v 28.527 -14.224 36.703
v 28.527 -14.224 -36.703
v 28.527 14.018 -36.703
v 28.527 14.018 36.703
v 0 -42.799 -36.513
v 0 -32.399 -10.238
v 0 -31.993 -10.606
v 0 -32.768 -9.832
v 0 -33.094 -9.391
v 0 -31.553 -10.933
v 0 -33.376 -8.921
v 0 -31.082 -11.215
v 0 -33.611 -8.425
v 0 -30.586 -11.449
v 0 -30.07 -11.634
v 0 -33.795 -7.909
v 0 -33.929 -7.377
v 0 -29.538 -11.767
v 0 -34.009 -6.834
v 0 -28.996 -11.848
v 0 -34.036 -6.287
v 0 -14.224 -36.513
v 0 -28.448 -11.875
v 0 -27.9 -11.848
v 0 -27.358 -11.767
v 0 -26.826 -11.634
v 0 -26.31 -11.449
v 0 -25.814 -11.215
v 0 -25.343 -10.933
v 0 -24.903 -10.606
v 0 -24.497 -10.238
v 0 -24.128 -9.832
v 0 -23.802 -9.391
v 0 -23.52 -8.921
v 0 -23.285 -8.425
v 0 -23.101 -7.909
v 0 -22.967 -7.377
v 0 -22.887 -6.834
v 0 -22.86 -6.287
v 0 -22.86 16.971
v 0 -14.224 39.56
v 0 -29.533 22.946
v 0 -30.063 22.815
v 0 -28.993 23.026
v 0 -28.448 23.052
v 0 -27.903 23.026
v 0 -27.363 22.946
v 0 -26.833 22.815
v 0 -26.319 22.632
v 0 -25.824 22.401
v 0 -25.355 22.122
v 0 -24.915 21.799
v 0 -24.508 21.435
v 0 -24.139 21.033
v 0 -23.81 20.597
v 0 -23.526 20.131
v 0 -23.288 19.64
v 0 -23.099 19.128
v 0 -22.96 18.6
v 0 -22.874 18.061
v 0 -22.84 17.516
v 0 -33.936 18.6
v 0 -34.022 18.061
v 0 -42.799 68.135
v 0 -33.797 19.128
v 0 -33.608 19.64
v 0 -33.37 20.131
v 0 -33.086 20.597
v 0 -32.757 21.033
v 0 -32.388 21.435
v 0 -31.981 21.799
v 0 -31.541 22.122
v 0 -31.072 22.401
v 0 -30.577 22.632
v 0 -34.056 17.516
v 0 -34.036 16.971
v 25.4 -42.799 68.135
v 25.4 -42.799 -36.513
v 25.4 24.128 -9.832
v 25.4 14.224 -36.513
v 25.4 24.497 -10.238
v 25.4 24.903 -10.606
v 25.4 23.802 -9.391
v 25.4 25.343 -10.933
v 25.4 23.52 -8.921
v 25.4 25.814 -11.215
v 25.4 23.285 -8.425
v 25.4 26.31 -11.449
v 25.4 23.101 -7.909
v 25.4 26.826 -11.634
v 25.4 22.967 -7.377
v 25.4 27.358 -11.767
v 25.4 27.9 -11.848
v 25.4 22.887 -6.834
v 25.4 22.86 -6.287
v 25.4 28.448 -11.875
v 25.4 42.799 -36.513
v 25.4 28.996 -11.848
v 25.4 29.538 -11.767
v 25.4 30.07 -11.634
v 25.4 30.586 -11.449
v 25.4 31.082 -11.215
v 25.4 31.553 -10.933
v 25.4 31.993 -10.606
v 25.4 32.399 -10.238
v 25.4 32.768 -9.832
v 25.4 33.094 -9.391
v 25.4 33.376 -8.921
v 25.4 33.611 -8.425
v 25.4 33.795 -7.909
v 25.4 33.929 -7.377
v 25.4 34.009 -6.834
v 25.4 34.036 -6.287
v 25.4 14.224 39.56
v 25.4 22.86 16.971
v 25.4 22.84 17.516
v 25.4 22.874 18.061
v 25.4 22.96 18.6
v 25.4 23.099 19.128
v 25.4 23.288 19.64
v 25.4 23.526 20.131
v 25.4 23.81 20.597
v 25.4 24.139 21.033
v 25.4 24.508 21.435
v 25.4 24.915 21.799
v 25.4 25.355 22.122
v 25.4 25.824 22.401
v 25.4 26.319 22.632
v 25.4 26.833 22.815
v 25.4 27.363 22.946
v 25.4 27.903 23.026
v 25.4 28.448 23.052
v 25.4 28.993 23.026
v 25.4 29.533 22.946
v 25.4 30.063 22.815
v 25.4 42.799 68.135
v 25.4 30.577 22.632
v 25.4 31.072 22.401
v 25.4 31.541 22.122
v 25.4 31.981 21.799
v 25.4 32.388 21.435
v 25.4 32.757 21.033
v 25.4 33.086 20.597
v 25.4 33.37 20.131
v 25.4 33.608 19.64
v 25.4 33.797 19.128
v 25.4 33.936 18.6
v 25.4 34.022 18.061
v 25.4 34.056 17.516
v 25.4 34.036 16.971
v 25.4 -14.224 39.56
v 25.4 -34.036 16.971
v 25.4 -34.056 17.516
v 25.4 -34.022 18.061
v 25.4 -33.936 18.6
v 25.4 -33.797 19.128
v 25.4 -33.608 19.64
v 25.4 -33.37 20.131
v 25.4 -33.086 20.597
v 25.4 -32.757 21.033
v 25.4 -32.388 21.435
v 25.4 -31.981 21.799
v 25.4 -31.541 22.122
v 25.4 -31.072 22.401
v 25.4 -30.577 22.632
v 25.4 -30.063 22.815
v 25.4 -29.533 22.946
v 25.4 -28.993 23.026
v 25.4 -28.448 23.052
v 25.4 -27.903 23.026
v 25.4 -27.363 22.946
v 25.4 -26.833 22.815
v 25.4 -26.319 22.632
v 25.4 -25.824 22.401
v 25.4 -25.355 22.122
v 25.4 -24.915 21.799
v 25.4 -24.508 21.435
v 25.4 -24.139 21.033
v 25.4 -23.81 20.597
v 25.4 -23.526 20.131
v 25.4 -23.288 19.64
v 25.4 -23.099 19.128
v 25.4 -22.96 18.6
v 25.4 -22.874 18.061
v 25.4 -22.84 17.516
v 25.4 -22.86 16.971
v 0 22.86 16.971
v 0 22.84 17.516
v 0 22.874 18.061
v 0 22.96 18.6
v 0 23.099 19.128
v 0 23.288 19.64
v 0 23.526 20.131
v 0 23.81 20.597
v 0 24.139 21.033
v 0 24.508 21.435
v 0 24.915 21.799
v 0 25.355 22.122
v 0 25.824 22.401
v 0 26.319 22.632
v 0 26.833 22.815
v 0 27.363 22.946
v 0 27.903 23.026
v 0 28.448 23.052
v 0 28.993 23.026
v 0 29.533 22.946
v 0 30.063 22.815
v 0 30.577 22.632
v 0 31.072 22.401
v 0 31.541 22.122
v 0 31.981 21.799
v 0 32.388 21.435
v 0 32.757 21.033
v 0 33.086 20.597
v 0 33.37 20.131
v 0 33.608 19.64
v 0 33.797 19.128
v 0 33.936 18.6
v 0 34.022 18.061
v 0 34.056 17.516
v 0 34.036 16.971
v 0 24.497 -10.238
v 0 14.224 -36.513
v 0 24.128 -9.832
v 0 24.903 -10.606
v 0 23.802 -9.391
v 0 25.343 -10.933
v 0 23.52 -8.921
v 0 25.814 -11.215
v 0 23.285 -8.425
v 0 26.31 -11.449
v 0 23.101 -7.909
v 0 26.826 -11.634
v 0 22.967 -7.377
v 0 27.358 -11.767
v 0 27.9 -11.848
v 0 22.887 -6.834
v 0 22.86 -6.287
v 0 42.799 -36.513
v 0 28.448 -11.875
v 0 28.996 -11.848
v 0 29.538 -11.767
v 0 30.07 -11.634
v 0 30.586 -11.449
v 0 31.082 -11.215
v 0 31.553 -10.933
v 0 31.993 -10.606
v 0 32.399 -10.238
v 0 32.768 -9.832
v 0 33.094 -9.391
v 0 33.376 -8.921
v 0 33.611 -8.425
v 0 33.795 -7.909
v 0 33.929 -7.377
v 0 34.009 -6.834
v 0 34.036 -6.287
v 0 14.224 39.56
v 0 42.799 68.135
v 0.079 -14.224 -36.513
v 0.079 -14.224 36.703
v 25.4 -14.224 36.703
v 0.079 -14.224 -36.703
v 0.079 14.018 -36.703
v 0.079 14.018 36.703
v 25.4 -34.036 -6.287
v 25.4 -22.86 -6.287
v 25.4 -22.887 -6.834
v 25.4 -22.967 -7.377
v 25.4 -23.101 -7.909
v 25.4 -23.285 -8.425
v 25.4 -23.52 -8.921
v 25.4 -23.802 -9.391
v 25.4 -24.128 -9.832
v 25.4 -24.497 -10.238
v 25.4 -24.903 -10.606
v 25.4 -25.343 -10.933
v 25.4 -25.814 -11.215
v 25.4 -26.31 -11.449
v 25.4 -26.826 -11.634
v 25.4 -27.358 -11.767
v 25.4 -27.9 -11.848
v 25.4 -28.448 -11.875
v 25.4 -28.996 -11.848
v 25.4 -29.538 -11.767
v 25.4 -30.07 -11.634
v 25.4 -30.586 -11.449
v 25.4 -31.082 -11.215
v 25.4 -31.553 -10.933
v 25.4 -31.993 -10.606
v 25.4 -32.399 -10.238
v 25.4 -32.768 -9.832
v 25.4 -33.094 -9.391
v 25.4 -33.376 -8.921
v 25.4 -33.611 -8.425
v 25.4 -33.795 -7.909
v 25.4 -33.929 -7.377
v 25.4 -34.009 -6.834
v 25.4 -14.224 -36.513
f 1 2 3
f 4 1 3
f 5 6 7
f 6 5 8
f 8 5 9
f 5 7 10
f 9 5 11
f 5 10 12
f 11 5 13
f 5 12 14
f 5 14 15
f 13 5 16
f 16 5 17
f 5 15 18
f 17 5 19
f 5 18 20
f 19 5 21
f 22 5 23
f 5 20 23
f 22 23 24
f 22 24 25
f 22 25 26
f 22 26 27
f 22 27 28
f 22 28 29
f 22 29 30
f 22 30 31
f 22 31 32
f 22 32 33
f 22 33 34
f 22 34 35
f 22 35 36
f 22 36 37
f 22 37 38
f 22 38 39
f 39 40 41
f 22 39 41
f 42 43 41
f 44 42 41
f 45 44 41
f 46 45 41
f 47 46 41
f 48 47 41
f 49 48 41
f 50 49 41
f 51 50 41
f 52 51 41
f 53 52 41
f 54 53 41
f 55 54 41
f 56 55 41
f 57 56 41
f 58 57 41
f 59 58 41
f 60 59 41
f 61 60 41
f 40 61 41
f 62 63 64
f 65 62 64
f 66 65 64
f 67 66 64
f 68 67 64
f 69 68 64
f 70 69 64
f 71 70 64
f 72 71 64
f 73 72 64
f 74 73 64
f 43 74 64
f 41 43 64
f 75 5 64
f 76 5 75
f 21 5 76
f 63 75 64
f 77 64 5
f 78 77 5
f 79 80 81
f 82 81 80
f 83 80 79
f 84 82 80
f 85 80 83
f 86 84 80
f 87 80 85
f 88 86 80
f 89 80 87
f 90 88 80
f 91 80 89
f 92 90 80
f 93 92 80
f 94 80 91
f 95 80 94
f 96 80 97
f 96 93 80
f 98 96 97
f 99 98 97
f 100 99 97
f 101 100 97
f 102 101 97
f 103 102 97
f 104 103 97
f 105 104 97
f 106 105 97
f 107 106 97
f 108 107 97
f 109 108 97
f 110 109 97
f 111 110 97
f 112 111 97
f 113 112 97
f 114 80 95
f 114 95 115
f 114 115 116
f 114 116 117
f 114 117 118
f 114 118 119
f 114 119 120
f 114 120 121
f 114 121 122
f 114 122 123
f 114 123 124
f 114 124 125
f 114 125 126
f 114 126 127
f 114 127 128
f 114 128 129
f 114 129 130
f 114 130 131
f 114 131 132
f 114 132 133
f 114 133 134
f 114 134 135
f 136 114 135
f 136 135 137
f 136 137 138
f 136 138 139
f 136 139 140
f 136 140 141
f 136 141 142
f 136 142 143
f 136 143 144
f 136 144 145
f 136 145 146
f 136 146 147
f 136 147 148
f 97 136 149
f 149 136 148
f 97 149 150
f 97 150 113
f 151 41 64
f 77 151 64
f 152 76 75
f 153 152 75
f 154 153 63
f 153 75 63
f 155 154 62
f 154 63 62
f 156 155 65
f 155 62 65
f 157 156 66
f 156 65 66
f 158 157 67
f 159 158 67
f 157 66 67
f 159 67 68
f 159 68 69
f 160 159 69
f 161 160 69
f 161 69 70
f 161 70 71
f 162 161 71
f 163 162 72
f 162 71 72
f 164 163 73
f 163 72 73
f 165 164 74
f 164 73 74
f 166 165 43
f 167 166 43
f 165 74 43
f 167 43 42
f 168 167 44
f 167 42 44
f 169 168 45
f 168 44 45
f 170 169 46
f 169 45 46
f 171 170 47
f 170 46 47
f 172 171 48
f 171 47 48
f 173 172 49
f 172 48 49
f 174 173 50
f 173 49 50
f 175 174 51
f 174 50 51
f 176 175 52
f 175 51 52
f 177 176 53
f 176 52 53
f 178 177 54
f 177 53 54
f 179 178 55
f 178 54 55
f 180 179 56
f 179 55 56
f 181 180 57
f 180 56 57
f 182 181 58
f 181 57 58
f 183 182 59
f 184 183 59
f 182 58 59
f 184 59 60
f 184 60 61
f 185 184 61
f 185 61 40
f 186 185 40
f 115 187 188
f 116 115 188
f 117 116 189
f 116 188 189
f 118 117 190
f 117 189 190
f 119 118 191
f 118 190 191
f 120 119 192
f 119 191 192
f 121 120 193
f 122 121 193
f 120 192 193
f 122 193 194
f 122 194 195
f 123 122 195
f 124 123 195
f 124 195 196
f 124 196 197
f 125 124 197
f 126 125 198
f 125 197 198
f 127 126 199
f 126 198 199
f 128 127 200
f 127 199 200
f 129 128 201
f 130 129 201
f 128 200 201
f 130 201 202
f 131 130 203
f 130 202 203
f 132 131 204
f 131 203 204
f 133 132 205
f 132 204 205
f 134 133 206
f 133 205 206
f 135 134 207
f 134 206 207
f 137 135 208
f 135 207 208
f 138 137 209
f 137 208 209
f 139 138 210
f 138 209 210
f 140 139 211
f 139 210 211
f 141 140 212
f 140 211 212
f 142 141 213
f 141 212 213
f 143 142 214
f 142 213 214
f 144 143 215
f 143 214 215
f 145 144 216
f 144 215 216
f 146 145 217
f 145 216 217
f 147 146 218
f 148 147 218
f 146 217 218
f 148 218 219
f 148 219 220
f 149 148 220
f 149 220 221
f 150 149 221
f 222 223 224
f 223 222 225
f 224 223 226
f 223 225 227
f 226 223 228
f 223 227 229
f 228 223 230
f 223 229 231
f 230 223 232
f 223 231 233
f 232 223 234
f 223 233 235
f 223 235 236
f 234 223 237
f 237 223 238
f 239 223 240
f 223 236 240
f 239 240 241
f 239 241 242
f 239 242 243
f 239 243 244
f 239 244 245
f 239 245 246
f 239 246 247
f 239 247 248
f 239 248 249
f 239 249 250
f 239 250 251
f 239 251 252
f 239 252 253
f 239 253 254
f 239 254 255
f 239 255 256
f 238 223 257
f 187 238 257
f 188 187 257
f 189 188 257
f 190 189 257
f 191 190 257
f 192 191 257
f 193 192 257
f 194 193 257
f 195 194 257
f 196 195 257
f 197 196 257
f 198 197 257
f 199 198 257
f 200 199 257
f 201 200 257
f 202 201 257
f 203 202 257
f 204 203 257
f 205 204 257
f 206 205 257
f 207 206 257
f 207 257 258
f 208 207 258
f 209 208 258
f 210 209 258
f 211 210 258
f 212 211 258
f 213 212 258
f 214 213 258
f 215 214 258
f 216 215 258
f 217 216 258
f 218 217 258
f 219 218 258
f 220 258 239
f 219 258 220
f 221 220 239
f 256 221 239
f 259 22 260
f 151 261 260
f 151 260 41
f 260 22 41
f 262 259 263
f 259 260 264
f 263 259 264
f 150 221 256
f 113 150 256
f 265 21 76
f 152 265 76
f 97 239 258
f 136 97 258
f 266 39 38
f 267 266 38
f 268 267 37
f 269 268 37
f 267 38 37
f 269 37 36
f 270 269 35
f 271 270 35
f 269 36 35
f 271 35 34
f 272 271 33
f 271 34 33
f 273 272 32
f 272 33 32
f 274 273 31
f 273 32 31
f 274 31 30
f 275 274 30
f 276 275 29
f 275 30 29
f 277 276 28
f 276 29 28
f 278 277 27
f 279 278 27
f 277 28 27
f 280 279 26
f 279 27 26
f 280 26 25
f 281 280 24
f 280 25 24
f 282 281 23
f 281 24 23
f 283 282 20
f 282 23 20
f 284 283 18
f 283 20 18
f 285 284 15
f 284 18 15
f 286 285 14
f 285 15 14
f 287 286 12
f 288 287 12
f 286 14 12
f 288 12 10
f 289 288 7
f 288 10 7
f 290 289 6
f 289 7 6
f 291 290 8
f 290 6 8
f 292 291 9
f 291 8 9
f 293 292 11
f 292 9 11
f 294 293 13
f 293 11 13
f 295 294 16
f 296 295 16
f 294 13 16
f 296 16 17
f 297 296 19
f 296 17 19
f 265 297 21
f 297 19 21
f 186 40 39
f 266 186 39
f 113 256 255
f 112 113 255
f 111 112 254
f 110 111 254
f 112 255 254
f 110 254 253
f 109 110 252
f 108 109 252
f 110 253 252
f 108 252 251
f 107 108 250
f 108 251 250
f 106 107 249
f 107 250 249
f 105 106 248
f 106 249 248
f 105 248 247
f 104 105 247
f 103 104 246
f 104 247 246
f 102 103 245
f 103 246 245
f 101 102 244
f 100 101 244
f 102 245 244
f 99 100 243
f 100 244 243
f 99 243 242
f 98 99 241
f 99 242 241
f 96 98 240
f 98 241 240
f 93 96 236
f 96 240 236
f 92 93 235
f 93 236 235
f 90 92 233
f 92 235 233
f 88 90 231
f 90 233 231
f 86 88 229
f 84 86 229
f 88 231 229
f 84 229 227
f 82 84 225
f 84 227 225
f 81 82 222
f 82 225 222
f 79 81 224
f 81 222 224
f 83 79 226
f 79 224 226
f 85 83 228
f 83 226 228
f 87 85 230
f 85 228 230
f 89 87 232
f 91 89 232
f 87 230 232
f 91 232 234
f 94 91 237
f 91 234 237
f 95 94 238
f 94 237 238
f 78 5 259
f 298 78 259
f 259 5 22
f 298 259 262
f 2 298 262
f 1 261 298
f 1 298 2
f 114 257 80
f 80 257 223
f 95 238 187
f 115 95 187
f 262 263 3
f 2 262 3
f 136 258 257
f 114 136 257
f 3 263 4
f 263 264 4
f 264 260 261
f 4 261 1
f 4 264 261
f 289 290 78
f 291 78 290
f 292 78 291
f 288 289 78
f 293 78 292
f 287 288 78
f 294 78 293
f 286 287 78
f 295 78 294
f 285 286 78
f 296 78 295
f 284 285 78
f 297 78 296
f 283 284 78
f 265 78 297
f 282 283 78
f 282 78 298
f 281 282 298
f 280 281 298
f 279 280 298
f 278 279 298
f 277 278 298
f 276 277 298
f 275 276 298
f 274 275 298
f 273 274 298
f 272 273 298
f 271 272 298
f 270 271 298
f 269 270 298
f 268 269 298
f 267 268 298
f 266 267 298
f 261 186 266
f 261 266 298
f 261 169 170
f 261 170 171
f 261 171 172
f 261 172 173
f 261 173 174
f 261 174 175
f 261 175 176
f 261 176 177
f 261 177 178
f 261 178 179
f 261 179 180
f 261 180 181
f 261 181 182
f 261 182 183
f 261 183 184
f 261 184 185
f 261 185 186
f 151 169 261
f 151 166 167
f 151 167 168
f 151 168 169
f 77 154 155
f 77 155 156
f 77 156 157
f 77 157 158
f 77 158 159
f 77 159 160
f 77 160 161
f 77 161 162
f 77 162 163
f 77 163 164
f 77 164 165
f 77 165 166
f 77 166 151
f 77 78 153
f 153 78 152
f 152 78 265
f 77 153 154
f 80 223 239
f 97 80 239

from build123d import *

# Parameters (mm, degrees)
F0_W     = 28.448
F0_H     = 28.241855
F1_DEPTH = 36.703
F2_W     = 28.575
F2_H     = 6.35
F3_DEPTH = 25.4


with BuildPart() as f1:
    # F0 (on Top) → F1 (new body, symmetric)
    with BuildSketch(Plane.XY):
        with Locations((14.303463, -0.103073)):
            Rectangle(F0_W, F0_H)
    extrude(amount=F1_DEPTH, both=True)

    # F2 (on Right) → F3 (join)
    with BuildSketch(Plane.YZ):
        Polygon((-42.799, -30.162666), (-14.224, -30.162666), (-14.224, 39.560334), (-25.273, 50.609334), (-25.273, 32.120805), (-42.799, 32.120805), align=None)
        with BuildLine():
            ThreePointArc((-22.86, -6.286666), (-28.448, -11.874666), (-34.036, -6.286666))
            Line((-34.036, -6.286666), (-34.036, 16.970864))
            ThreePointArc((-34.036, 16.970864), (-28.448, 23.052092), (-22.86, 16.970864))
            Line((-22.86, 16.970864), (-22.86, -6.286666))
        make_face(mode=Mode.SUBTRACT)
        Polygon((-42.799, 68.135334), (-42.799, 32.120805), (-25.273, 32.120805), (-25.273, 50.609334), align=None)
        with Locations((-28.5115, -33.337666)):
            Rectangle(F2_W, F2_H)
        Polygon((14.224, -30.162666), (42.799, -30.162666), (42.799, 32.120805), (25.273, 32.120805), (25.273, 50.609334), (14.224, 39.560334), align=None)
        with BuildLine():
            Line((22.86, -6.286666), (22.86, 16.970864))
            ThreePointArc((22.86, 16.970864), (28.448, 23.052092), (34.036, 16.970864))
            Line((34.036, 16.970864), (34.036, -6.286666))
            ThreePointArc((34.036, -6.286666), (28.448, -11.874666), (22.86, -6.286666))
        make_face(mode=Mode.SUBTRACT)
        with Locations((28.5115, -33.337666)):
            Rectangle(F2_W, F2_H)
        Polygon((25.273, 32.120805), (42.799, 32.120805), (42.799, 68.135334), (25.273, 50.609334), align=None)
    extrude(amount=F3_DEPTH)


solid = f1.part
